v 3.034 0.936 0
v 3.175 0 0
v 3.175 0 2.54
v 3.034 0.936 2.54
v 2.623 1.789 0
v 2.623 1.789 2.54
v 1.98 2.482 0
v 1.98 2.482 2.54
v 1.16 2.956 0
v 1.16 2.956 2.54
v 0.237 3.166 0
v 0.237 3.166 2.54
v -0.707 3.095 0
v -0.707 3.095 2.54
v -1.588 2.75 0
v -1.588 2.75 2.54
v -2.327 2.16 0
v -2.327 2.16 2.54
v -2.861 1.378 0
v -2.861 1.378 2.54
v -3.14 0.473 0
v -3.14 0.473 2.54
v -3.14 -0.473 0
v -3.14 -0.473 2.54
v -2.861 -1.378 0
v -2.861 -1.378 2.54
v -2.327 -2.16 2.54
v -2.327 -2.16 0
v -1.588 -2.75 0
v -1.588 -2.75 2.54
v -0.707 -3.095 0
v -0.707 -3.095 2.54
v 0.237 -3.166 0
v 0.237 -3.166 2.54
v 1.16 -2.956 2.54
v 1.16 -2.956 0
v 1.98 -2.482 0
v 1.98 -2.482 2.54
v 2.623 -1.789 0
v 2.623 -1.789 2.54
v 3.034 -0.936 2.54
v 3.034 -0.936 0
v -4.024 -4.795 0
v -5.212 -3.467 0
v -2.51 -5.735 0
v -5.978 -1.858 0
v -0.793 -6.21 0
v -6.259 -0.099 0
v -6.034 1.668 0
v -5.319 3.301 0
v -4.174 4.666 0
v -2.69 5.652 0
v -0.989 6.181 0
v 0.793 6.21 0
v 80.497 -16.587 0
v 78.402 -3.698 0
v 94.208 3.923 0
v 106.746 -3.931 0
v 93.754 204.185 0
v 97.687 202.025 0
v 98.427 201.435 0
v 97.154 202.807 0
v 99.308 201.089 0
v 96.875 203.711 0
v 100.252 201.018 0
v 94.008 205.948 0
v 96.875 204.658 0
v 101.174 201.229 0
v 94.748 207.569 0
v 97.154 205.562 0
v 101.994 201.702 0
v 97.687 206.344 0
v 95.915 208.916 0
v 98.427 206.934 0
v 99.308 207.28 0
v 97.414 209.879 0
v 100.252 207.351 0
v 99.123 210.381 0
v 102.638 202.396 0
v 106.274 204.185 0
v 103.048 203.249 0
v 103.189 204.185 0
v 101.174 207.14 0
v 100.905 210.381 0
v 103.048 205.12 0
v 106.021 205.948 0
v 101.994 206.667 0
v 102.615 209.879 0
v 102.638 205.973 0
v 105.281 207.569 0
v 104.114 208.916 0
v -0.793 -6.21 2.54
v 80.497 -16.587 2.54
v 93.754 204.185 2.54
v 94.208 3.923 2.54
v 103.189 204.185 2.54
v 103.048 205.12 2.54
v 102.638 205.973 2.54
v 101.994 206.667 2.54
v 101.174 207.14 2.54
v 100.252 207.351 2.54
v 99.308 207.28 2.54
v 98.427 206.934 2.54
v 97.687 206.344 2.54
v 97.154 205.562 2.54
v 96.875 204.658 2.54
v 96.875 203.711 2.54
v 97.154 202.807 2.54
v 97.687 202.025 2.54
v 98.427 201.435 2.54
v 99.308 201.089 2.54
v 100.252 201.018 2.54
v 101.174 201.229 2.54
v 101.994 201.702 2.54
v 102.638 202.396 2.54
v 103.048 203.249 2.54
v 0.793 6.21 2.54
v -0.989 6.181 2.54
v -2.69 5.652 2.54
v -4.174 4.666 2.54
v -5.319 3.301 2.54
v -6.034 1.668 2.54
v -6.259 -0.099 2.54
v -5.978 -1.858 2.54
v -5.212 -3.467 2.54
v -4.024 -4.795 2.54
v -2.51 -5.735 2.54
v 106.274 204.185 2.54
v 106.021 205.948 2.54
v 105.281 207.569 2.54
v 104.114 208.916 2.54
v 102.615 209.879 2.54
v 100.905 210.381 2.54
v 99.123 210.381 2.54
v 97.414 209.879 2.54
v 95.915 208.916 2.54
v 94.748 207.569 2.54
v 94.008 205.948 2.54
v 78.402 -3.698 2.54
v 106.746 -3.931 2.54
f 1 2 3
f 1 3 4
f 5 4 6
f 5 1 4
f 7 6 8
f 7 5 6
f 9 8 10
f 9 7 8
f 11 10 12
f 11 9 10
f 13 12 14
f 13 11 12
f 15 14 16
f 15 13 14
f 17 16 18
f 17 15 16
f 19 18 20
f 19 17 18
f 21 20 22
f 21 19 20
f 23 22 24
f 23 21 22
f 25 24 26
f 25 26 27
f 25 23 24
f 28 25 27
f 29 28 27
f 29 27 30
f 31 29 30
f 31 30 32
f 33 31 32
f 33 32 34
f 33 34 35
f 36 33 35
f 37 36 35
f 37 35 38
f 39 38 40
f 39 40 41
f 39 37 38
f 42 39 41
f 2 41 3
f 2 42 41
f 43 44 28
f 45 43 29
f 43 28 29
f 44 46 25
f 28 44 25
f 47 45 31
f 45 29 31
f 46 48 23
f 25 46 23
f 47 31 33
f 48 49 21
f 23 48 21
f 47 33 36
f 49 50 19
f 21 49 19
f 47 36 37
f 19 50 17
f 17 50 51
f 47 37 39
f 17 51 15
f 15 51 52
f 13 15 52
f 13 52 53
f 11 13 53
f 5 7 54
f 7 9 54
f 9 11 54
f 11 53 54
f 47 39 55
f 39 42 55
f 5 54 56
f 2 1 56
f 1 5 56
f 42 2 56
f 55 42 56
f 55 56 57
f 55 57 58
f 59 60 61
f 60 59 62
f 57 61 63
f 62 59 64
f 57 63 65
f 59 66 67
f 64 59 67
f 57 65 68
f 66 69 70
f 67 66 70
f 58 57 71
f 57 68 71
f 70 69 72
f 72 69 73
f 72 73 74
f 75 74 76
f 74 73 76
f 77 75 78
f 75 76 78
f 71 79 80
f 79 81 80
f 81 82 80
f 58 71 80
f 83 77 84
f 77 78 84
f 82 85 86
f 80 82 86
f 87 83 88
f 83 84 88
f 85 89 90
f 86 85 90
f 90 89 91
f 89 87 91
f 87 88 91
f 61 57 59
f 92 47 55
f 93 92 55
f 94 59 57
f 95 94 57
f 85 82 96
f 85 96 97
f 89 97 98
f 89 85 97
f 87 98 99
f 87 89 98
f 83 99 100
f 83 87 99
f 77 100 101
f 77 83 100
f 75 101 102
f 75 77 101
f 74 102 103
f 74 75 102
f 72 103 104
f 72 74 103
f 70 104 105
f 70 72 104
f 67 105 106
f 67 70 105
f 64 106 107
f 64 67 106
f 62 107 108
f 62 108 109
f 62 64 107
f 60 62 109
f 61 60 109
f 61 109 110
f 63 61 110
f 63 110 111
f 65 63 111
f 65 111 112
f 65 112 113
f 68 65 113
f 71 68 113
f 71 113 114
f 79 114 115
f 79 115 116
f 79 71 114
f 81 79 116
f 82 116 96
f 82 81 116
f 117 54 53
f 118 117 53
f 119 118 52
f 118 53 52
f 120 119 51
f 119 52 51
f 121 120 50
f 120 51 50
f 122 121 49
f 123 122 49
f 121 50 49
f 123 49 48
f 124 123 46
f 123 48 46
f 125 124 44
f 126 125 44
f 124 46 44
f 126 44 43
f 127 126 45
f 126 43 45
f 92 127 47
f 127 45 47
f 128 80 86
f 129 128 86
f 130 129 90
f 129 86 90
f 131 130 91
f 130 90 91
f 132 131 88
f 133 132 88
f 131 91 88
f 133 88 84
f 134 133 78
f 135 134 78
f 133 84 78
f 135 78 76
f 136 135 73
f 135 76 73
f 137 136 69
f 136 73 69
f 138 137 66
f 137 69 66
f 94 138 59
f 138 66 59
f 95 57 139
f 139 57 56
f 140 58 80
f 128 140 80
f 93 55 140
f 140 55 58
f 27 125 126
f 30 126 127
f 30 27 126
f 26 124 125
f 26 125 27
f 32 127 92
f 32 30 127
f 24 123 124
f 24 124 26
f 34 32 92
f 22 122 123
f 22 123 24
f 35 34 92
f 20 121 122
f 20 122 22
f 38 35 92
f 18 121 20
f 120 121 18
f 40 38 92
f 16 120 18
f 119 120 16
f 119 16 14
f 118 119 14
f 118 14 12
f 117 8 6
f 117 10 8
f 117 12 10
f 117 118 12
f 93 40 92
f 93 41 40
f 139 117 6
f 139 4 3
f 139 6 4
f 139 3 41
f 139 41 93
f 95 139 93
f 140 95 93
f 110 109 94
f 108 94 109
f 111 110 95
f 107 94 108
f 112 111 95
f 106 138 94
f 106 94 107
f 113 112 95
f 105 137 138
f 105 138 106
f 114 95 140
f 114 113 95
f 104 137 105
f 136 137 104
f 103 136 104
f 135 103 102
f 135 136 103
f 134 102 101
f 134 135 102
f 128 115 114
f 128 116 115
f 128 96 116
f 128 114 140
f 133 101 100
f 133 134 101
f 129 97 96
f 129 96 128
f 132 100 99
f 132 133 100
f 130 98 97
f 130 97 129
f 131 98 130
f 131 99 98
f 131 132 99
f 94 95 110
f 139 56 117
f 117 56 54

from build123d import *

# Parameters (mm, degrees)
SKETCH1_R           = 3.175
BOSS_EXTRUDE1_DEPTH = 2.54


with BuildPart() as part:
    # Sketch1 → Boss-Extrude1 (new body)
    with BuildSketch(Plane.XY):
        with BuildLine():
            Line((-0.792713517, -6.209589215), (80.497230298, -16.587028851))
            Line((80.497230298, -16.587028851), (106.74595178, -3.93139528))
            Line((106.74595178, -3.93139528), (106.274352446, 204.184578368))
            ThreePointArc((106.274352446, 204.184578368), (100.014368984, 210.444561829), (93.754385523, 204.184578368))
            Line((93.754385523, 204.184578368), (94.208186896, 3.92281412))
            Line((94.208186896, 3.92281412), (78.402076612, -3.697989053))
            Line((78.402076612, -3.697989053), (0.792713517, 6.209589215))
            ThreePointArc((0.792713517, 6.209589215), (-6.209589215, 0.792713517), (-0.792713517, -6.209589215))
        make_face()
        Circle(SKETCH1_R, mode=Mode.SUBTRACT)
        with Locations((100.014368984, 204.184578368)):
            Circle(SKETCH1_R, mode=Mode.SUBTRACT)
    extrude(amount=BOSS_EXTRUDE1_DEPTH)


solid = part.part
